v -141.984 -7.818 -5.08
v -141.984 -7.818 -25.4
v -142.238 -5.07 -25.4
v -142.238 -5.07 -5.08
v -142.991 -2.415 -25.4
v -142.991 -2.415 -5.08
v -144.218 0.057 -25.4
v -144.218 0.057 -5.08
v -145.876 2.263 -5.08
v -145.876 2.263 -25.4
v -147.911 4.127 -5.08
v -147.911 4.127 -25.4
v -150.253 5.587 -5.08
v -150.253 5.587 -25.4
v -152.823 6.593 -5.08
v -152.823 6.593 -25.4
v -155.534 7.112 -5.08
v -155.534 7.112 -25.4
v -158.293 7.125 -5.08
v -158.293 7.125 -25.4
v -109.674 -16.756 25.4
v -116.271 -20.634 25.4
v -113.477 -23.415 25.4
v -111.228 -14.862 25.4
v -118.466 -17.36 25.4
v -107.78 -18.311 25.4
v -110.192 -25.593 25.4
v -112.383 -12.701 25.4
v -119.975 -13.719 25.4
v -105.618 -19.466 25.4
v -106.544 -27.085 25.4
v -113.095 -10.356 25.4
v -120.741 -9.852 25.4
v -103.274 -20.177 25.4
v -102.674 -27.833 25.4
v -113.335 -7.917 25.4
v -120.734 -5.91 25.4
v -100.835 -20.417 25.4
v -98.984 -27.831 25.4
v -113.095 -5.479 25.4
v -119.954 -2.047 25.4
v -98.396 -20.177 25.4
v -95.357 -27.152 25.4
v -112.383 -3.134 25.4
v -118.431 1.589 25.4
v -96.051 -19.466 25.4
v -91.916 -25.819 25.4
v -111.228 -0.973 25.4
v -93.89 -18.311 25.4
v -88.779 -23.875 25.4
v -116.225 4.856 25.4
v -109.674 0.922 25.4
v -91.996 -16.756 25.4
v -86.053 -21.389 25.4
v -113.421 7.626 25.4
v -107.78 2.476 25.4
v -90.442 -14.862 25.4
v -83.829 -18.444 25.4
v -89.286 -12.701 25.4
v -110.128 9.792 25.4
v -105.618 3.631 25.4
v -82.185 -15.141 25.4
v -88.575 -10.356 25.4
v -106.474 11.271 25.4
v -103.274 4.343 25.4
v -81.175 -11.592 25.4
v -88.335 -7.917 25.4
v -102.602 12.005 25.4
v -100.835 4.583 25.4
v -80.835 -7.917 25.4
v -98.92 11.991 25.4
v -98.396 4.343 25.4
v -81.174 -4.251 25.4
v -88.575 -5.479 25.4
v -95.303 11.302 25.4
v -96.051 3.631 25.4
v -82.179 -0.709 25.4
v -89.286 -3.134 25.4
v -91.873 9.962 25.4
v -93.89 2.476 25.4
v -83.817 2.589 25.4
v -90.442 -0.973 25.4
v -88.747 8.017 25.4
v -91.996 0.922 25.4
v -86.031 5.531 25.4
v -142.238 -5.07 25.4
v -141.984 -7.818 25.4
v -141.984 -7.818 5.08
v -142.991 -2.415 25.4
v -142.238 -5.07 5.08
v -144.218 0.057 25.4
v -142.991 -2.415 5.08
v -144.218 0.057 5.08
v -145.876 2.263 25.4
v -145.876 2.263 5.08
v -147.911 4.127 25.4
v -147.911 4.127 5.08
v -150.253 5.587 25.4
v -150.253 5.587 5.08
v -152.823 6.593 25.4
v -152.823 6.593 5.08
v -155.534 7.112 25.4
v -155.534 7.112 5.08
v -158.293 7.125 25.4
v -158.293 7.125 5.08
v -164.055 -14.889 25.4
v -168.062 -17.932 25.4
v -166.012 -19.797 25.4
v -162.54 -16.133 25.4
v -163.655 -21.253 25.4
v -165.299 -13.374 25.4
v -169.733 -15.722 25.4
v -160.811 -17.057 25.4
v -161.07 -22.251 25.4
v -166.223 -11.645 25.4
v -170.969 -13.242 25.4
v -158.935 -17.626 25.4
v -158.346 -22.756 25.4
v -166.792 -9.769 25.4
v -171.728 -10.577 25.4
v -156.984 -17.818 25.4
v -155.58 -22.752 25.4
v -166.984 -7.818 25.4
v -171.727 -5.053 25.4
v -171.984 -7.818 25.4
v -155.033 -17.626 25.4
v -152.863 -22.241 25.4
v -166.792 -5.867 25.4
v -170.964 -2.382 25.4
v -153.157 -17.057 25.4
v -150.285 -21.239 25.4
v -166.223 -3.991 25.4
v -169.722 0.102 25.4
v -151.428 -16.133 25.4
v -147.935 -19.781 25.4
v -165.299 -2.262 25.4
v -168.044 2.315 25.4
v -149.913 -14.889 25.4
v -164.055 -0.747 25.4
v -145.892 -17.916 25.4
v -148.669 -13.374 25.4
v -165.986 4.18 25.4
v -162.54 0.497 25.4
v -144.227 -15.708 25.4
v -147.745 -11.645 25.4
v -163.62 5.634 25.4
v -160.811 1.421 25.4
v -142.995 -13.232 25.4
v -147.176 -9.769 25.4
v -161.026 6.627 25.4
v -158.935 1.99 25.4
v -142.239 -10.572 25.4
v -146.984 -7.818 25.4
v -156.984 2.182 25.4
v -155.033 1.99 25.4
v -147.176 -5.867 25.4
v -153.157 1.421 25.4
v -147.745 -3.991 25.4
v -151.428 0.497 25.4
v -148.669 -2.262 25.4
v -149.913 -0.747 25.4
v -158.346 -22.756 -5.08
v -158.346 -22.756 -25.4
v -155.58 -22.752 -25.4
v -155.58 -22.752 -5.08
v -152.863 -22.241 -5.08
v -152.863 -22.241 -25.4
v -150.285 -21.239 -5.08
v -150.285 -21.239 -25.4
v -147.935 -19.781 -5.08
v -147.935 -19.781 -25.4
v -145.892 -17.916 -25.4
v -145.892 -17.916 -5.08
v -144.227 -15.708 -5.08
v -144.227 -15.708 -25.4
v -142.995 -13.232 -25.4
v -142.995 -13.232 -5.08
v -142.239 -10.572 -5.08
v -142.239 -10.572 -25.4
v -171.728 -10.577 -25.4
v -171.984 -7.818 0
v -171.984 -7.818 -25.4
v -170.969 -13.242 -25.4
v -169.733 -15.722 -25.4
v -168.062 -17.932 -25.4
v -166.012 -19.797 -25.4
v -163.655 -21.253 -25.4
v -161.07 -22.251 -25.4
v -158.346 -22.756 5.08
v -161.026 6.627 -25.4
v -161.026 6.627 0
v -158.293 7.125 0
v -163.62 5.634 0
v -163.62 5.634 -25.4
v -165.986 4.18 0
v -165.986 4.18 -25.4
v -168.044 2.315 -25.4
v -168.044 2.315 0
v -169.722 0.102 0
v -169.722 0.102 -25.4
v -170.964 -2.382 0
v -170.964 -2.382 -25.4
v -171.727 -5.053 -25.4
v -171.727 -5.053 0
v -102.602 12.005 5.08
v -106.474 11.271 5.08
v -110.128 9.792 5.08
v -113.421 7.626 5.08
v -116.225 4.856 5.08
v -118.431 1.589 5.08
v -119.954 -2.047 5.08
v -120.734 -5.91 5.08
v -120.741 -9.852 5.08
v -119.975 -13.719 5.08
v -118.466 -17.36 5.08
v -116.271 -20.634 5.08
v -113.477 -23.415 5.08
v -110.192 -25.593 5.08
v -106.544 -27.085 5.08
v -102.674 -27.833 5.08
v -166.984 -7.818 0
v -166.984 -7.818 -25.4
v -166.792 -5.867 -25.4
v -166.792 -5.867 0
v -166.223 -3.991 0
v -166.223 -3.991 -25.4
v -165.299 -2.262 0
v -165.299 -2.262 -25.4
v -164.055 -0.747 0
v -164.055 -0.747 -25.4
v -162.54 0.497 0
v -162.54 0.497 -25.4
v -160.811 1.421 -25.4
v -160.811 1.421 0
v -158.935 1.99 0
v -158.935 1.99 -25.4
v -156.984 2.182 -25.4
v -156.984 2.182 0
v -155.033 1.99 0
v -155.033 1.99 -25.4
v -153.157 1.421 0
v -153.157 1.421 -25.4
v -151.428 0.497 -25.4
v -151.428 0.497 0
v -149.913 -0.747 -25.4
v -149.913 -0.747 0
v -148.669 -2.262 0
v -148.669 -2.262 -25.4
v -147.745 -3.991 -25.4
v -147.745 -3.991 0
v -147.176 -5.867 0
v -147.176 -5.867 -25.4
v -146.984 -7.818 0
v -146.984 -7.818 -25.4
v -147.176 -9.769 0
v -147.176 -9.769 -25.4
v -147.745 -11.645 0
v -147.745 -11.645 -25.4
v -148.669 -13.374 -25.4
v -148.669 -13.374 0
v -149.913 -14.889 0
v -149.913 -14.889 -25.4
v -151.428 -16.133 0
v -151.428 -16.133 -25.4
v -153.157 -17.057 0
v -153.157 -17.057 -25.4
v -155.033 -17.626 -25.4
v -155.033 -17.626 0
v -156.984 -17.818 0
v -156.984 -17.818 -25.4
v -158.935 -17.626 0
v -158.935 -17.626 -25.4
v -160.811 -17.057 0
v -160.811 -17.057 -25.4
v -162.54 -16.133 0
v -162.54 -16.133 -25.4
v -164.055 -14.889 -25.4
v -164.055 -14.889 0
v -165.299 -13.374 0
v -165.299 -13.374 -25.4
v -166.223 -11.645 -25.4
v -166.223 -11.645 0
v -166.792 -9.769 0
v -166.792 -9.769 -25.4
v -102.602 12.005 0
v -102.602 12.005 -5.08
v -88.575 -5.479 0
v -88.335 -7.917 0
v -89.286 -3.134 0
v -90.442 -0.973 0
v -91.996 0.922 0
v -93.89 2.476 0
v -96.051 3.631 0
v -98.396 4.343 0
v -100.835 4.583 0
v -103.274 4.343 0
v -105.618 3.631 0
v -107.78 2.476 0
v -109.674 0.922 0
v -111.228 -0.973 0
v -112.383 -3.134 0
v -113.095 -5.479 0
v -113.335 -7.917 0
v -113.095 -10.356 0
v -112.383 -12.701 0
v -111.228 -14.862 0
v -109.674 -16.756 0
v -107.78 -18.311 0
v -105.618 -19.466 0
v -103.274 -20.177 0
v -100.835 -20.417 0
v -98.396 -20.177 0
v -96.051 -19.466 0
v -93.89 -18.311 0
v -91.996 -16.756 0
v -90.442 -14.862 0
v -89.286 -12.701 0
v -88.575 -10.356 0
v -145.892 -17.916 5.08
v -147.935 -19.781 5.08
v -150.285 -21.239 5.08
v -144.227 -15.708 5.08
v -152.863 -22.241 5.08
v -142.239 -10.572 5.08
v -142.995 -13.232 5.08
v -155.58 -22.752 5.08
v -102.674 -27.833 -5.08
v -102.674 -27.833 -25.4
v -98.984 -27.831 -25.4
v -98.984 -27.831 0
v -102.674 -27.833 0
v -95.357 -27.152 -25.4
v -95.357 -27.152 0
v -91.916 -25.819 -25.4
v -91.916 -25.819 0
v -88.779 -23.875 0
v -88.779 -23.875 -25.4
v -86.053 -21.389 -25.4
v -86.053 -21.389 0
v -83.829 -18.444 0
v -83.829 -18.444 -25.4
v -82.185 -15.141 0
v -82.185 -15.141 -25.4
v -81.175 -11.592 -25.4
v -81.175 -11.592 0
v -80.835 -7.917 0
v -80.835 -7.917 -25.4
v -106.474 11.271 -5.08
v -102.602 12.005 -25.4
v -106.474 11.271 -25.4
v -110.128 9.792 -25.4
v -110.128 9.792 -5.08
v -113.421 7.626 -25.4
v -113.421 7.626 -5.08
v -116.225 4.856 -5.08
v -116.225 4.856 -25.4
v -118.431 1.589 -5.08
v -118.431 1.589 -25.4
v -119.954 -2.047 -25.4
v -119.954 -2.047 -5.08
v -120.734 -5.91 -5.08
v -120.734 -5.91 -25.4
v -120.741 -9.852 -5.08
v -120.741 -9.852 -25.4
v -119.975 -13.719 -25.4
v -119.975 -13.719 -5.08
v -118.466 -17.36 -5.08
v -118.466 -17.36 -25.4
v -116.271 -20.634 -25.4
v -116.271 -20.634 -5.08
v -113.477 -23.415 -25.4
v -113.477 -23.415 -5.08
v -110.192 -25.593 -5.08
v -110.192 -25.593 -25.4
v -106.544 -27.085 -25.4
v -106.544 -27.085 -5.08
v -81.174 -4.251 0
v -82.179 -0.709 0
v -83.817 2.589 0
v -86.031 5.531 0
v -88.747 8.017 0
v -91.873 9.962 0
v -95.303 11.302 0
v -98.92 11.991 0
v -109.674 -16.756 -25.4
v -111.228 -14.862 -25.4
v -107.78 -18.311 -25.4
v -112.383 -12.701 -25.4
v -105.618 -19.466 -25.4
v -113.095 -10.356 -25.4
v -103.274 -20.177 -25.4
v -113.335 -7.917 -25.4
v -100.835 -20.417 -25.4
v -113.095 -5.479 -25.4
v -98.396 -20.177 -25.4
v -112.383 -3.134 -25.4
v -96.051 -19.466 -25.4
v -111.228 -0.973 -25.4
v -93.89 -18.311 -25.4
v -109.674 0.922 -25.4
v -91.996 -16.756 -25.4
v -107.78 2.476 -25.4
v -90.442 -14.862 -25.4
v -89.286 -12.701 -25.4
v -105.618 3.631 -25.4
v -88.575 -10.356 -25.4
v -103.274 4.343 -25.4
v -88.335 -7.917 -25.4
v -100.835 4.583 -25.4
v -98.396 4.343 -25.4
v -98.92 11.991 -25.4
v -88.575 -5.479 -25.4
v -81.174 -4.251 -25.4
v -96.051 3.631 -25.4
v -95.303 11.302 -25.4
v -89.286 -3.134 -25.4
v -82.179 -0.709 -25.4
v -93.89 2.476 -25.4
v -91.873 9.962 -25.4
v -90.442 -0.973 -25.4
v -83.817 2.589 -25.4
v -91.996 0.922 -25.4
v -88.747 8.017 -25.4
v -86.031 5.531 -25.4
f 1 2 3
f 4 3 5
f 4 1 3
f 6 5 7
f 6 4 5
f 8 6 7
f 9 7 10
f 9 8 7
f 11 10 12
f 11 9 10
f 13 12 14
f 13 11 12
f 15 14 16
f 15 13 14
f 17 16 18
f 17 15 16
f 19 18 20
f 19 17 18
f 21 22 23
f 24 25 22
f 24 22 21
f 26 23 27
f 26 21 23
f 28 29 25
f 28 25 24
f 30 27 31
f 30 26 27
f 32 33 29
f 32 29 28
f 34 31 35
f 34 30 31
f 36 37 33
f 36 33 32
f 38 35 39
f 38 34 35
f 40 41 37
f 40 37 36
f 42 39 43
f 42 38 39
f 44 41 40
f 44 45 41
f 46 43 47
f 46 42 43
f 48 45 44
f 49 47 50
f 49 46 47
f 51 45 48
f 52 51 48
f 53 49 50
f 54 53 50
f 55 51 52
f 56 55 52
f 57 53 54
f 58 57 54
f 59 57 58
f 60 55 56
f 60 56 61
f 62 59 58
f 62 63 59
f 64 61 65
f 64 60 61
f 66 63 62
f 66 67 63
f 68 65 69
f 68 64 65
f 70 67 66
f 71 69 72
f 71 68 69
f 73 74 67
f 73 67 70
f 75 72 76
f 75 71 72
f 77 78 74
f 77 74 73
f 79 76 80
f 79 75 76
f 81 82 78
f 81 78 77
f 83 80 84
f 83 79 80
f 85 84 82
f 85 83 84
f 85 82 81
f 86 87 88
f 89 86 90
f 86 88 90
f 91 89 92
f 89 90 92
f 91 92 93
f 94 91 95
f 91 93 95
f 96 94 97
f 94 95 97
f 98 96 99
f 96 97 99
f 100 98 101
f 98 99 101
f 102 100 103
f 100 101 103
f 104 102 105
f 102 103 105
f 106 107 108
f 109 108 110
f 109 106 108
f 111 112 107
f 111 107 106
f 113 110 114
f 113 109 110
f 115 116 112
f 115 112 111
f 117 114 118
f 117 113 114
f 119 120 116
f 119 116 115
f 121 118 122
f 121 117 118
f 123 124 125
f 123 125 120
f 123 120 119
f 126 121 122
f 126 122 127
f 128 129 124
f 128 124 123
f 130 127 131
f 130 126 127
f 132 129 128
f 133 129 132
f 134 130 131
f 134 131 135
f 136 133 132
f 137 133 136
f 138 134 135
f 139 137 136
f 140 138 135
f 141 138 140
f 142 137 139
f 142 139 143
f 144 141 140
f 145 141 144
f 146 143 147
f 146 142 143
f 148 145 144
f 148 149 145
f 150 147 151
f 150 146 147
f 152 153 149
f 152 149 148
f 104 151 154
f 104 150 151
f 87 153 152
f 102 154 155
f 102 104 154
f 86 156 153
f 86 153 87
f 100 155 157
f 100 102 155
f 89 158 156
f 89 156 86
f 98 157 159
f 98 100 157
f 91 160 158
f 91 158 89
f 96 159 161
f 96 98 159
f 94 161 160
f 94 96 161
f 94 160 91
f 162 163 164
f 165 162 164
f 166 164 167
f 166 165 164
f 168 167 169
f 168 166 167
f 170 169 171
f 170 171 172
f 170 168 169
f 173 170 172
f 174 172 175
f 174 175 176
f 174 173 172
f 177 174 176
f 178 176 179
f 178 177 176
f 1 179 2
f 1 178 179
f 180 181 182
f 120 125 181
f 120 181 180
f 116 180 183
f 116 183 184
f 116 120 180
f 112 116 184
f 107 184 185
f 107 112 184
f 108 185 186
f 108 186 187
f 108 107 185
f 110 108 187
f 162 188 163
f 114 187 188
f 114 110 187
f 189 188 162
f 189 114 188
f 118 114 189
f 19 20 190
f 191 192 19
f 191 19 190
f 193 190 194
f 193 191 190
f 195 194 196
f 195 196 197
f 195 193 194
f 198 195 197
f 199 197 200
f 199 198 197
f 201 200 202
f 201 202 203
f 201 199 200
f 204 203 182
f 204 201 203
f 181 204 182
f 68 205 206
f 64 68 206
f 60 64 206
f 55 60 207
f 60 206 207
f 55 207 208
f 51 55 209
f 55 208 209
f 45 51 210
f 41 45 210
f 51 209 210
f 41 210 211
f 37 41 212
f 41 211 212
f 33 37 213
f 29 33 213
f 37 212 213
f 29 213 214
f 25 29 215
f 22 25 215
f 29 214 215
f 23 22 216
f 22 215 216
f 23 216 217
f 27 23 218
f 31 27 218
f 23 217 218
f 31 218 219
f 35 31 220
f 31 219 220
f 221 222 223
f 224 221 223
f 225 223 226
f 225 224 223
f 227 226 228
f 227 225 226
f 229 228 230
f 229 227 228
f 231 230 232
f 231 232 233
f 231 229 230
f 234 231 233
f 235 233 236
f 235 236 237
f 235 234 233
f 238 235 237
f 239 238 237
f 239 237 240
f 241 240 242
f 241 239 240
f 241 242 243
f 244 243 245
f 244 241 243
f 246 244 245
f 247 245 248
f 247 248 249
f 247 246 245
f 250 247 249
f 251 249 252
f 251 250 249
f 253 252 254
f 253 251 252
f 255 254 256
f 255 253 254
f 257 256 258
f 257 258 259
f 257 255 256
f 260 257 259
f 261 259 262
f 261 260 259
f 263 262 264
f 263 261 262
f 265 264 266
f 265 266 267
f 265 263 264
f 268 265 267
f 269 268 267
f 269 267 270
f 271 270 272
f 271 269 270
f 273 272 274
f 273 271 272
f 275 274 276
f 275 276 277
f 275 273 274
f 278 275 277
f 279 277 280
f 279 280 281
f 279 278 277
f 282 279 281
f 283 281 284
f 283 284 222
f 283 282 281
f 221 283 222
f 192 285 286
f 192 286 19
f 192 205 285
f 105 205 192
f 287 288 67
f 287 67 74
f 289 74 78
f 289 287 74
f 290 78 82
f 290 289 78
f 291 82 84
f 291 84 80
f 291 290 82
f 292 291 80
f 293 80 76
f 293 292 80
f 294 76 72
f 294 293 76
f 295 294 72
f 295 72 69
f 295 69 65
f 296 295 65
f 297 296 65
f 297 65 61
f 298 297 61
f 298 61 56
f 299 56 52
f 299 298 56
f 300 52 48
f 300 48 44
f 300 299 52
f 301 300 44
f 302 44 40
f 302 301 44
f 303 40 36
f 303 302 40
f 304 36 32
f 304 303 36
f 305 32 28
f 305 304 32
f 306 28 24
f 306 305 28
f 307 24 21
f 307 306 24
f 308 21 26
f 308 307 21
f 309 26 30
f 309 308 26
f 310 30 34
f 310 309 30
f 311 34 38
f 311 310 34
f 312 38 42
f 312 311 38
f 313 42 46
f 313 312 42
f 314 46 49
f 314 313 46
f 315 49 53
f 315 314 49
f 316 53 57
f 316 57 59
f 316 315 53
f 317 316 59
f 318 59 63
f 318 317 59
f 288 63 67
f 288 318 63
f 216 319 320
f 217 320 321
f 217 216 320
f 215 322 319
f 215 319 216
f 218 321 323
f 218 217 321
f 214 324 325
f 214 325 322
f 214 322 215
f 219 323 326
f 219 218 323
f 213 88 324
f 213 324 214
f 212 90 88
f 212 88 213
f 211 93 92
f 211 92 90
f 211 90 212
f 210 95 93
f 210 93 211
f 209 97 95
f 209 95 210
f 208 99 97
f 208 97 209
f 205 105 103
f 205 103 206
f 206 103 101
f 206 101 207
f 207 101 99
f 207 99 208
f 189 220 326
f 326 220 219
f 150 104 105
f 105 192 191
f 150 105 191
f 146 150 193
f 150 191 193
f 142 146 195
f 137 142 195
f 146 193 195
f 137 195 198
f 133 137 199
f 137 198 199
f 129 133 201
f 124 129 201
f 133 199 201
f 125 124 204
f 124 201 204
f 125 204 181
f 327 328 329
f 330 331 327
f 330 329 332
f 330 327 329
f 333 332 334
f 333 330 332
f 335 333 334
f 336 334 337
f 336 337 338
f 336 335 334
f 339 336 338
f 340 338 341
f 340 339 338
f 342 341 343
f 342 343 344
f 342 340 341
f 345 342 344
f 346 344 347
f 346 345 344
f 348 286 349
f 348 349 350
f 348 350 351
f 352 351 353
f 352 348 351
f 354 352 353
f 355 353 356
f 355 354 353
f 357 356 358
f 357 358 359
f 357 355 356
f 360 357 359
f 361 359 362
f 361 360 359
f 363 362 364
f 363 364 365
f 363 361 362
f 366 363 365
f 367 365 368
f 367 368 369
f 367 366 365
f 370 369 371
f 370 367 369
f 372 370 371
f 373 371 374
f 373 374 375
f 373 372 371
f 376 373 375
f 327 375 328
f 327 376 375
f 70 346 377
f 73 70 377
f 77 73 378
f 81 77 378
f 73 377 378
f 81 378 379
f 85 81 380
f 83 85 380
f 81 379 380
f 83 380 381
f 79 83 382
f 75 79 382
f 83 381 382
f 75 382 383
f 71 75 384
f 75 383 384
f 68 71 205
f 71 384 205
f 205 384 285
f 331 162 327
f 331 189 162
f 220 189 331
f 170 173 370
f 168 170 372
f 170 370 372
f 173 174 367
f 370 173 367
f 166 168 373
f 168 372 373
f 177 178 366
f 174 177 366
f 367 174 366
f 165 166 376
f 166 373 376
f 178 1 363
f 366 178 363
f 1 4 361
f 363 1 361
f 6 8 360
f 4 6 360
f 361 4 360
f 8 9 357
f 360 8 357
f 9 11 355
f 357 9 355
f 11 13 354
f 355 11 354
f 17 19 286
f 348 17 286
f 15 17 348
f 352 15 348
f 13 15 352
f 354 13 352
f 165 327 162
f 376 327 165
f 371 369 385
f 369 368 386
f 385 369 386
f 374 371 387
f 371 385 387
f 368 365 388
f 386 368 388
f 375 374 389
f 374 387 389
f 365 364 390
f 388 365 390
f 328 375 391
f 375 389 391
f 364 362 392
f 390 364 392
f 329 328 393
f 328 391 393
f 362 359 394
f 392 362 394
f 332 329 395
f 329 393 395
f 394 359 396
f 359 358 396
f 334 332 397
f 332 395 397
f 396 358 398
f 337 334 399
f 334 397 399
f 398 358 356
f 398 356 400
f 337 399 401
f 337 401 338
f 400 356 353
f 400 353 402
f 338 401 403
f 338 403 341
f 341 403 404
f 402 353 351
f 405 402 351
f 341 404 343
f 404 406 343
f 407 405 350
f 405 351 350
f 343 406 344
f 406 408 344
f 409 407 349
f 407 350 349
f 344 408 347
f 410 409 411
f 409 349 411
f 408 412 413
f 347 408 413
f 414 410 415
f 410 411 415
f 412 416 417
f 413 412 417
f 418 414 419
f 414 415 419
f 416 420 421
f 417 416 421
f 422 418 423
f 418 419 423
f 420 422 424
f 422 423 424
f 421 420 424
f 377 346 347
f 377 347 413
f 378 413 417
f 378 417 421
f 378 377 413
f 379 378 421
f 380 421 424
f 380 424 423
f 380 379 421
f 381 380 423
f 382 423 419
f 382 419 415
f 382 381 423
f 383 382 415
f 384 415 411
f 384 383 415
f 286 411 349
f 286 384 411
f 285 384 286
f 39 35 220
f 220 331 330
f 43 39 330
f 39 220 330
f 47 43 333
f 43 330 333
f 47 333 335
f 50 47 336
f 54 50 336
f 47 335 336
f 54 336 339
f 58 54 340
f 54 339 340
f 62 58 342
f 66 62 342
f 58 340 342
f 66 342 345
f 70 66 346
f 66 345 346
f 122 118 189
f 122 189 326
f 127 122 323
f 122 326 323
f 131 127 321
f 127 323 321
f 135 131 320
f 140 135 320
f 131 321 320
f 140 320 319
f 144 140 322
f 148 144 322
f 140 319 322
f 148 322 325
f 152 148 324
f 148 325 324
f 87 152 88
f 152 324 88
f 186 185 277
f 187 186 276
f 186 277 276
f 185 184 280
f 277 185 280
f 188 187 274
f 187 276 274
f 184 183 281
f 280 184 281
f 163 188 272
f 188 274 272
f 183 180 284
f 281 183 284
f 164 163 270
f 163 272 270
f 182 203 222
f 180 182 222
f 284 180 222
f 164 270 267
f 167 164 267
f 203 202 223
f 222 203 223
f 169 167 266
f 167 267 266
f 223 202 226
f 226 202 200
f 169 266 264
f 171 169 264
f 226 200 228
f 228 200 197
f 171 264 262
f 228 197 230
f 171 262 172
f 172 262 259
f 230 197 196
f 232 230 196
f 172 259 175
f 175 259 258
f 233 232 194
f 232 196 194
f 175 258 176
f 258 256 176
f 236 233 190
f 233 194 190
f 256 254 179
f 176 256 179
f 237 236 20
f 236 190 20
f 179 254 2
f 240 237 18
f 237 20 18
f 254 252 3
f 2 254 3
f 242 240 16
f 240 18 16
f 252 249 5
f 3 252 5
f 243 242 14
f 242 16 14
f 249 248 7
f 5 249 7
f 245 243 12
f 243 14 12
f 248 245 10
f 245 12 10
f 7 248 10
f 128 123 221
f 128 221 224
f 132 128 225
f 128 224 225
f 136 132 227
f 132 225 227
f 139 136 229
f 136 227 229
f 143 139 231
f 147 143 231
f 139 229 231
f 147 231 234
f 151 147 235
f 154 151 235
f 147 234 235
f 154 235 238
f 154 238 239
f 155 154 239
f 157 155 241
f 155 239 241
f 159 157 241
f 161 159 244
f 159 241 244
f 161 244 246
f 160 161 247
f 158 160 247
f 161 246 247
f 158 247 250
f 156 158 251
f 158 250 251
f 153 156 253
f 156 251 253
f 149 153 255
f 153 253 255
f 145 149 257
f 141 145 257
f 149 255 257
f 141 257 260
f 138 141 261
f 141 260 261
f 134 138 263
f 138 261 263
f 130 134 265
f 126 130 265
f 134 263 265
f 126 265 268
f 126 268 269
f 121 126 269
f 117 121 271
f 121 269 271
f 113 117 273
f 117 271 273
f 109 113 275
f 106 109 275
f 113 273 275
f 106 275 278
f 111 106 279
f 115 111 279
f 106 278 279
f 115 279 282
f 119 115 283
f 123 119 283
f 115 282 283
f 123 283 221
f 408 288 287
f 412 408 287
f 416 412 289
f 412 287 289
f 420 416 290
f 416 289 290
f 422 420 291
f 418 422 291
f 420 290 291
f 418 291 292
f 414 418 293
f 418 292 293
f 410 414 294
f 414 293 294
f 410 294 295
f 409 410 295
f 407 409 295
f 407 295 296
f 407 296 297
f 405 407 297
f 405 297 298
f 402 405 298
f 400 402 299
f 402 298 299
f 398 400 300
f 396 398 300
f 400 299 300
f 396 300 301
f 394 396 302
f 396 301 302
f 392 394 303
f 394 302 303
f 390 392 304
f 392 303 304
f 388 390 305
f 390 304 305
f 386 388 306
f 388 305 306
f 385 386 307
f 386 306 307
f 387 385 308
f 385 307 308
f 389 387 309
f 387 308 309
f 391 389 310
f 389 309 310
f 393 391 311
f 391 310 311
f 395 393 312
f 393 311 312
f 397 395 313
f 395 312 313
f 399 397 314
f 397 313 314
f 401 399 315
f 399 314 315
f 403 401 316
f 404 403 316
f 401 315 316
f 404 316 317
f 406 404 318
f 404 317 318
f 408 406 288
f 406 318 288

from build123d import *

# Parameters (mm, degrees)
F1_DEPTH      = 25.4
F1_DEPTH_BACK = 25.4
F2_DEPTH      = 5.08
F2_DEPTH_BACK = 5.08
F0_R          = 12.5
F3_DEPTH      = 25.4
F3_DEPTH_BACK = 25.4


# Not quite as in the source:
# - ends of sketch curves that miss each other by under 0.0002 mm in the source are joined


with BuildPart() as f1:
    # F0 (on Top) → F1 (new body, two sides)
    with BuildSketch(Plane.XY) as f1_sk:
        with BuildLine():
            ThreePointArc((-141.983922, -7.818031), (-146.8508026584, 3.2418013861), (-158.2932409879, 7.1247158622))
            ThreePointArc((-158.2932409879, 7.1247158622), (-168.0437543861, 2.3150883416), (-171.983922, -7.818031))
            ThreePointArc((-171.983922, -7.818031), (-168.0616462811, -17.9315874838), (-158.3460520332, -22.7560563639))
            ThreePointArc((-158.3460520332, -22.7560563639), (-146.8703655162, -18.8957552811), (-141.983922, -7.818031))
        make_face()
        with BuildLine():
            ThreePointArc((-146.983922, -7.818031), (-156.983922, -17.818031), (-166.983922, -7.818031))
            ThreePointArc((-166.983922, -7.818031), (-156.983922, 2.181969), (-146.983922, -7.818031))
        make_face(mode=Mode.SUBTRACT)
    extrude(amount=F1_DEPTH)
    extrude(f1_sk.sketch, amount=-F1_DEPTH_BACK)

    # F0 (on Top) → F2 (join, two sides)
    with BuildSketch(Plane.XY) as f2_sk:
        with BuildLine():
            ThreePointArc((-102.6737479638, -27.8325586075), (-120.8349111956, -7.8810440571), (-102.601594983, 12.004552808))
            Line((-102.601594983, 12.004552808), (-158.293241, 7.124716))
            ThreePointArc((-158.293241, 7.124716), (-146.8508026584, 3.2418013861), (-141.983922, -7.818031))
            ThreePointArc((-141.983922, -7.818031), (-146.8703655162, -18.8957552811), (-158.3460520332, -22.7560563639))
            Line((-158.3460520332, -22.7560563639), (-102.6737479638, -27.8325586075))
        make_face()
    extrude(amount=F2_DEPTH)
    extrude(f2_sk.sketch, amount=-F2_DEPTH_BACK)

    # F0 (on Top) → F3 (join, two sides)
    with BuildSketch(Plane.XY) as f3_sk:
        with BuildLine():
            ThreePointArc((-102.6737479638, -27.8325586075), (-87.3585958165, -22.6952258981), (-80.834944, -7.917268))
            ThreePointArc((-80.834944, -7.917268), (-87.3318521255, 6.8362573357), (-102.601594983, 12.004552808))
            ThreePointArc((-102.601594983, 12.004552808), (-120.8349111956, -7.8810440571), (-102.6737479638, -27.8325586075))
        make_face()
        with Locations((-100.834944, -7.917268)):
            Circle(F0_R, mode=Mode.SUBTRACT)
    extrude(amount=F3_DEPTH)
    extrude(f3_sk.sketch, amount=-F3_DEPTH_BACK)


solid = f1.part
